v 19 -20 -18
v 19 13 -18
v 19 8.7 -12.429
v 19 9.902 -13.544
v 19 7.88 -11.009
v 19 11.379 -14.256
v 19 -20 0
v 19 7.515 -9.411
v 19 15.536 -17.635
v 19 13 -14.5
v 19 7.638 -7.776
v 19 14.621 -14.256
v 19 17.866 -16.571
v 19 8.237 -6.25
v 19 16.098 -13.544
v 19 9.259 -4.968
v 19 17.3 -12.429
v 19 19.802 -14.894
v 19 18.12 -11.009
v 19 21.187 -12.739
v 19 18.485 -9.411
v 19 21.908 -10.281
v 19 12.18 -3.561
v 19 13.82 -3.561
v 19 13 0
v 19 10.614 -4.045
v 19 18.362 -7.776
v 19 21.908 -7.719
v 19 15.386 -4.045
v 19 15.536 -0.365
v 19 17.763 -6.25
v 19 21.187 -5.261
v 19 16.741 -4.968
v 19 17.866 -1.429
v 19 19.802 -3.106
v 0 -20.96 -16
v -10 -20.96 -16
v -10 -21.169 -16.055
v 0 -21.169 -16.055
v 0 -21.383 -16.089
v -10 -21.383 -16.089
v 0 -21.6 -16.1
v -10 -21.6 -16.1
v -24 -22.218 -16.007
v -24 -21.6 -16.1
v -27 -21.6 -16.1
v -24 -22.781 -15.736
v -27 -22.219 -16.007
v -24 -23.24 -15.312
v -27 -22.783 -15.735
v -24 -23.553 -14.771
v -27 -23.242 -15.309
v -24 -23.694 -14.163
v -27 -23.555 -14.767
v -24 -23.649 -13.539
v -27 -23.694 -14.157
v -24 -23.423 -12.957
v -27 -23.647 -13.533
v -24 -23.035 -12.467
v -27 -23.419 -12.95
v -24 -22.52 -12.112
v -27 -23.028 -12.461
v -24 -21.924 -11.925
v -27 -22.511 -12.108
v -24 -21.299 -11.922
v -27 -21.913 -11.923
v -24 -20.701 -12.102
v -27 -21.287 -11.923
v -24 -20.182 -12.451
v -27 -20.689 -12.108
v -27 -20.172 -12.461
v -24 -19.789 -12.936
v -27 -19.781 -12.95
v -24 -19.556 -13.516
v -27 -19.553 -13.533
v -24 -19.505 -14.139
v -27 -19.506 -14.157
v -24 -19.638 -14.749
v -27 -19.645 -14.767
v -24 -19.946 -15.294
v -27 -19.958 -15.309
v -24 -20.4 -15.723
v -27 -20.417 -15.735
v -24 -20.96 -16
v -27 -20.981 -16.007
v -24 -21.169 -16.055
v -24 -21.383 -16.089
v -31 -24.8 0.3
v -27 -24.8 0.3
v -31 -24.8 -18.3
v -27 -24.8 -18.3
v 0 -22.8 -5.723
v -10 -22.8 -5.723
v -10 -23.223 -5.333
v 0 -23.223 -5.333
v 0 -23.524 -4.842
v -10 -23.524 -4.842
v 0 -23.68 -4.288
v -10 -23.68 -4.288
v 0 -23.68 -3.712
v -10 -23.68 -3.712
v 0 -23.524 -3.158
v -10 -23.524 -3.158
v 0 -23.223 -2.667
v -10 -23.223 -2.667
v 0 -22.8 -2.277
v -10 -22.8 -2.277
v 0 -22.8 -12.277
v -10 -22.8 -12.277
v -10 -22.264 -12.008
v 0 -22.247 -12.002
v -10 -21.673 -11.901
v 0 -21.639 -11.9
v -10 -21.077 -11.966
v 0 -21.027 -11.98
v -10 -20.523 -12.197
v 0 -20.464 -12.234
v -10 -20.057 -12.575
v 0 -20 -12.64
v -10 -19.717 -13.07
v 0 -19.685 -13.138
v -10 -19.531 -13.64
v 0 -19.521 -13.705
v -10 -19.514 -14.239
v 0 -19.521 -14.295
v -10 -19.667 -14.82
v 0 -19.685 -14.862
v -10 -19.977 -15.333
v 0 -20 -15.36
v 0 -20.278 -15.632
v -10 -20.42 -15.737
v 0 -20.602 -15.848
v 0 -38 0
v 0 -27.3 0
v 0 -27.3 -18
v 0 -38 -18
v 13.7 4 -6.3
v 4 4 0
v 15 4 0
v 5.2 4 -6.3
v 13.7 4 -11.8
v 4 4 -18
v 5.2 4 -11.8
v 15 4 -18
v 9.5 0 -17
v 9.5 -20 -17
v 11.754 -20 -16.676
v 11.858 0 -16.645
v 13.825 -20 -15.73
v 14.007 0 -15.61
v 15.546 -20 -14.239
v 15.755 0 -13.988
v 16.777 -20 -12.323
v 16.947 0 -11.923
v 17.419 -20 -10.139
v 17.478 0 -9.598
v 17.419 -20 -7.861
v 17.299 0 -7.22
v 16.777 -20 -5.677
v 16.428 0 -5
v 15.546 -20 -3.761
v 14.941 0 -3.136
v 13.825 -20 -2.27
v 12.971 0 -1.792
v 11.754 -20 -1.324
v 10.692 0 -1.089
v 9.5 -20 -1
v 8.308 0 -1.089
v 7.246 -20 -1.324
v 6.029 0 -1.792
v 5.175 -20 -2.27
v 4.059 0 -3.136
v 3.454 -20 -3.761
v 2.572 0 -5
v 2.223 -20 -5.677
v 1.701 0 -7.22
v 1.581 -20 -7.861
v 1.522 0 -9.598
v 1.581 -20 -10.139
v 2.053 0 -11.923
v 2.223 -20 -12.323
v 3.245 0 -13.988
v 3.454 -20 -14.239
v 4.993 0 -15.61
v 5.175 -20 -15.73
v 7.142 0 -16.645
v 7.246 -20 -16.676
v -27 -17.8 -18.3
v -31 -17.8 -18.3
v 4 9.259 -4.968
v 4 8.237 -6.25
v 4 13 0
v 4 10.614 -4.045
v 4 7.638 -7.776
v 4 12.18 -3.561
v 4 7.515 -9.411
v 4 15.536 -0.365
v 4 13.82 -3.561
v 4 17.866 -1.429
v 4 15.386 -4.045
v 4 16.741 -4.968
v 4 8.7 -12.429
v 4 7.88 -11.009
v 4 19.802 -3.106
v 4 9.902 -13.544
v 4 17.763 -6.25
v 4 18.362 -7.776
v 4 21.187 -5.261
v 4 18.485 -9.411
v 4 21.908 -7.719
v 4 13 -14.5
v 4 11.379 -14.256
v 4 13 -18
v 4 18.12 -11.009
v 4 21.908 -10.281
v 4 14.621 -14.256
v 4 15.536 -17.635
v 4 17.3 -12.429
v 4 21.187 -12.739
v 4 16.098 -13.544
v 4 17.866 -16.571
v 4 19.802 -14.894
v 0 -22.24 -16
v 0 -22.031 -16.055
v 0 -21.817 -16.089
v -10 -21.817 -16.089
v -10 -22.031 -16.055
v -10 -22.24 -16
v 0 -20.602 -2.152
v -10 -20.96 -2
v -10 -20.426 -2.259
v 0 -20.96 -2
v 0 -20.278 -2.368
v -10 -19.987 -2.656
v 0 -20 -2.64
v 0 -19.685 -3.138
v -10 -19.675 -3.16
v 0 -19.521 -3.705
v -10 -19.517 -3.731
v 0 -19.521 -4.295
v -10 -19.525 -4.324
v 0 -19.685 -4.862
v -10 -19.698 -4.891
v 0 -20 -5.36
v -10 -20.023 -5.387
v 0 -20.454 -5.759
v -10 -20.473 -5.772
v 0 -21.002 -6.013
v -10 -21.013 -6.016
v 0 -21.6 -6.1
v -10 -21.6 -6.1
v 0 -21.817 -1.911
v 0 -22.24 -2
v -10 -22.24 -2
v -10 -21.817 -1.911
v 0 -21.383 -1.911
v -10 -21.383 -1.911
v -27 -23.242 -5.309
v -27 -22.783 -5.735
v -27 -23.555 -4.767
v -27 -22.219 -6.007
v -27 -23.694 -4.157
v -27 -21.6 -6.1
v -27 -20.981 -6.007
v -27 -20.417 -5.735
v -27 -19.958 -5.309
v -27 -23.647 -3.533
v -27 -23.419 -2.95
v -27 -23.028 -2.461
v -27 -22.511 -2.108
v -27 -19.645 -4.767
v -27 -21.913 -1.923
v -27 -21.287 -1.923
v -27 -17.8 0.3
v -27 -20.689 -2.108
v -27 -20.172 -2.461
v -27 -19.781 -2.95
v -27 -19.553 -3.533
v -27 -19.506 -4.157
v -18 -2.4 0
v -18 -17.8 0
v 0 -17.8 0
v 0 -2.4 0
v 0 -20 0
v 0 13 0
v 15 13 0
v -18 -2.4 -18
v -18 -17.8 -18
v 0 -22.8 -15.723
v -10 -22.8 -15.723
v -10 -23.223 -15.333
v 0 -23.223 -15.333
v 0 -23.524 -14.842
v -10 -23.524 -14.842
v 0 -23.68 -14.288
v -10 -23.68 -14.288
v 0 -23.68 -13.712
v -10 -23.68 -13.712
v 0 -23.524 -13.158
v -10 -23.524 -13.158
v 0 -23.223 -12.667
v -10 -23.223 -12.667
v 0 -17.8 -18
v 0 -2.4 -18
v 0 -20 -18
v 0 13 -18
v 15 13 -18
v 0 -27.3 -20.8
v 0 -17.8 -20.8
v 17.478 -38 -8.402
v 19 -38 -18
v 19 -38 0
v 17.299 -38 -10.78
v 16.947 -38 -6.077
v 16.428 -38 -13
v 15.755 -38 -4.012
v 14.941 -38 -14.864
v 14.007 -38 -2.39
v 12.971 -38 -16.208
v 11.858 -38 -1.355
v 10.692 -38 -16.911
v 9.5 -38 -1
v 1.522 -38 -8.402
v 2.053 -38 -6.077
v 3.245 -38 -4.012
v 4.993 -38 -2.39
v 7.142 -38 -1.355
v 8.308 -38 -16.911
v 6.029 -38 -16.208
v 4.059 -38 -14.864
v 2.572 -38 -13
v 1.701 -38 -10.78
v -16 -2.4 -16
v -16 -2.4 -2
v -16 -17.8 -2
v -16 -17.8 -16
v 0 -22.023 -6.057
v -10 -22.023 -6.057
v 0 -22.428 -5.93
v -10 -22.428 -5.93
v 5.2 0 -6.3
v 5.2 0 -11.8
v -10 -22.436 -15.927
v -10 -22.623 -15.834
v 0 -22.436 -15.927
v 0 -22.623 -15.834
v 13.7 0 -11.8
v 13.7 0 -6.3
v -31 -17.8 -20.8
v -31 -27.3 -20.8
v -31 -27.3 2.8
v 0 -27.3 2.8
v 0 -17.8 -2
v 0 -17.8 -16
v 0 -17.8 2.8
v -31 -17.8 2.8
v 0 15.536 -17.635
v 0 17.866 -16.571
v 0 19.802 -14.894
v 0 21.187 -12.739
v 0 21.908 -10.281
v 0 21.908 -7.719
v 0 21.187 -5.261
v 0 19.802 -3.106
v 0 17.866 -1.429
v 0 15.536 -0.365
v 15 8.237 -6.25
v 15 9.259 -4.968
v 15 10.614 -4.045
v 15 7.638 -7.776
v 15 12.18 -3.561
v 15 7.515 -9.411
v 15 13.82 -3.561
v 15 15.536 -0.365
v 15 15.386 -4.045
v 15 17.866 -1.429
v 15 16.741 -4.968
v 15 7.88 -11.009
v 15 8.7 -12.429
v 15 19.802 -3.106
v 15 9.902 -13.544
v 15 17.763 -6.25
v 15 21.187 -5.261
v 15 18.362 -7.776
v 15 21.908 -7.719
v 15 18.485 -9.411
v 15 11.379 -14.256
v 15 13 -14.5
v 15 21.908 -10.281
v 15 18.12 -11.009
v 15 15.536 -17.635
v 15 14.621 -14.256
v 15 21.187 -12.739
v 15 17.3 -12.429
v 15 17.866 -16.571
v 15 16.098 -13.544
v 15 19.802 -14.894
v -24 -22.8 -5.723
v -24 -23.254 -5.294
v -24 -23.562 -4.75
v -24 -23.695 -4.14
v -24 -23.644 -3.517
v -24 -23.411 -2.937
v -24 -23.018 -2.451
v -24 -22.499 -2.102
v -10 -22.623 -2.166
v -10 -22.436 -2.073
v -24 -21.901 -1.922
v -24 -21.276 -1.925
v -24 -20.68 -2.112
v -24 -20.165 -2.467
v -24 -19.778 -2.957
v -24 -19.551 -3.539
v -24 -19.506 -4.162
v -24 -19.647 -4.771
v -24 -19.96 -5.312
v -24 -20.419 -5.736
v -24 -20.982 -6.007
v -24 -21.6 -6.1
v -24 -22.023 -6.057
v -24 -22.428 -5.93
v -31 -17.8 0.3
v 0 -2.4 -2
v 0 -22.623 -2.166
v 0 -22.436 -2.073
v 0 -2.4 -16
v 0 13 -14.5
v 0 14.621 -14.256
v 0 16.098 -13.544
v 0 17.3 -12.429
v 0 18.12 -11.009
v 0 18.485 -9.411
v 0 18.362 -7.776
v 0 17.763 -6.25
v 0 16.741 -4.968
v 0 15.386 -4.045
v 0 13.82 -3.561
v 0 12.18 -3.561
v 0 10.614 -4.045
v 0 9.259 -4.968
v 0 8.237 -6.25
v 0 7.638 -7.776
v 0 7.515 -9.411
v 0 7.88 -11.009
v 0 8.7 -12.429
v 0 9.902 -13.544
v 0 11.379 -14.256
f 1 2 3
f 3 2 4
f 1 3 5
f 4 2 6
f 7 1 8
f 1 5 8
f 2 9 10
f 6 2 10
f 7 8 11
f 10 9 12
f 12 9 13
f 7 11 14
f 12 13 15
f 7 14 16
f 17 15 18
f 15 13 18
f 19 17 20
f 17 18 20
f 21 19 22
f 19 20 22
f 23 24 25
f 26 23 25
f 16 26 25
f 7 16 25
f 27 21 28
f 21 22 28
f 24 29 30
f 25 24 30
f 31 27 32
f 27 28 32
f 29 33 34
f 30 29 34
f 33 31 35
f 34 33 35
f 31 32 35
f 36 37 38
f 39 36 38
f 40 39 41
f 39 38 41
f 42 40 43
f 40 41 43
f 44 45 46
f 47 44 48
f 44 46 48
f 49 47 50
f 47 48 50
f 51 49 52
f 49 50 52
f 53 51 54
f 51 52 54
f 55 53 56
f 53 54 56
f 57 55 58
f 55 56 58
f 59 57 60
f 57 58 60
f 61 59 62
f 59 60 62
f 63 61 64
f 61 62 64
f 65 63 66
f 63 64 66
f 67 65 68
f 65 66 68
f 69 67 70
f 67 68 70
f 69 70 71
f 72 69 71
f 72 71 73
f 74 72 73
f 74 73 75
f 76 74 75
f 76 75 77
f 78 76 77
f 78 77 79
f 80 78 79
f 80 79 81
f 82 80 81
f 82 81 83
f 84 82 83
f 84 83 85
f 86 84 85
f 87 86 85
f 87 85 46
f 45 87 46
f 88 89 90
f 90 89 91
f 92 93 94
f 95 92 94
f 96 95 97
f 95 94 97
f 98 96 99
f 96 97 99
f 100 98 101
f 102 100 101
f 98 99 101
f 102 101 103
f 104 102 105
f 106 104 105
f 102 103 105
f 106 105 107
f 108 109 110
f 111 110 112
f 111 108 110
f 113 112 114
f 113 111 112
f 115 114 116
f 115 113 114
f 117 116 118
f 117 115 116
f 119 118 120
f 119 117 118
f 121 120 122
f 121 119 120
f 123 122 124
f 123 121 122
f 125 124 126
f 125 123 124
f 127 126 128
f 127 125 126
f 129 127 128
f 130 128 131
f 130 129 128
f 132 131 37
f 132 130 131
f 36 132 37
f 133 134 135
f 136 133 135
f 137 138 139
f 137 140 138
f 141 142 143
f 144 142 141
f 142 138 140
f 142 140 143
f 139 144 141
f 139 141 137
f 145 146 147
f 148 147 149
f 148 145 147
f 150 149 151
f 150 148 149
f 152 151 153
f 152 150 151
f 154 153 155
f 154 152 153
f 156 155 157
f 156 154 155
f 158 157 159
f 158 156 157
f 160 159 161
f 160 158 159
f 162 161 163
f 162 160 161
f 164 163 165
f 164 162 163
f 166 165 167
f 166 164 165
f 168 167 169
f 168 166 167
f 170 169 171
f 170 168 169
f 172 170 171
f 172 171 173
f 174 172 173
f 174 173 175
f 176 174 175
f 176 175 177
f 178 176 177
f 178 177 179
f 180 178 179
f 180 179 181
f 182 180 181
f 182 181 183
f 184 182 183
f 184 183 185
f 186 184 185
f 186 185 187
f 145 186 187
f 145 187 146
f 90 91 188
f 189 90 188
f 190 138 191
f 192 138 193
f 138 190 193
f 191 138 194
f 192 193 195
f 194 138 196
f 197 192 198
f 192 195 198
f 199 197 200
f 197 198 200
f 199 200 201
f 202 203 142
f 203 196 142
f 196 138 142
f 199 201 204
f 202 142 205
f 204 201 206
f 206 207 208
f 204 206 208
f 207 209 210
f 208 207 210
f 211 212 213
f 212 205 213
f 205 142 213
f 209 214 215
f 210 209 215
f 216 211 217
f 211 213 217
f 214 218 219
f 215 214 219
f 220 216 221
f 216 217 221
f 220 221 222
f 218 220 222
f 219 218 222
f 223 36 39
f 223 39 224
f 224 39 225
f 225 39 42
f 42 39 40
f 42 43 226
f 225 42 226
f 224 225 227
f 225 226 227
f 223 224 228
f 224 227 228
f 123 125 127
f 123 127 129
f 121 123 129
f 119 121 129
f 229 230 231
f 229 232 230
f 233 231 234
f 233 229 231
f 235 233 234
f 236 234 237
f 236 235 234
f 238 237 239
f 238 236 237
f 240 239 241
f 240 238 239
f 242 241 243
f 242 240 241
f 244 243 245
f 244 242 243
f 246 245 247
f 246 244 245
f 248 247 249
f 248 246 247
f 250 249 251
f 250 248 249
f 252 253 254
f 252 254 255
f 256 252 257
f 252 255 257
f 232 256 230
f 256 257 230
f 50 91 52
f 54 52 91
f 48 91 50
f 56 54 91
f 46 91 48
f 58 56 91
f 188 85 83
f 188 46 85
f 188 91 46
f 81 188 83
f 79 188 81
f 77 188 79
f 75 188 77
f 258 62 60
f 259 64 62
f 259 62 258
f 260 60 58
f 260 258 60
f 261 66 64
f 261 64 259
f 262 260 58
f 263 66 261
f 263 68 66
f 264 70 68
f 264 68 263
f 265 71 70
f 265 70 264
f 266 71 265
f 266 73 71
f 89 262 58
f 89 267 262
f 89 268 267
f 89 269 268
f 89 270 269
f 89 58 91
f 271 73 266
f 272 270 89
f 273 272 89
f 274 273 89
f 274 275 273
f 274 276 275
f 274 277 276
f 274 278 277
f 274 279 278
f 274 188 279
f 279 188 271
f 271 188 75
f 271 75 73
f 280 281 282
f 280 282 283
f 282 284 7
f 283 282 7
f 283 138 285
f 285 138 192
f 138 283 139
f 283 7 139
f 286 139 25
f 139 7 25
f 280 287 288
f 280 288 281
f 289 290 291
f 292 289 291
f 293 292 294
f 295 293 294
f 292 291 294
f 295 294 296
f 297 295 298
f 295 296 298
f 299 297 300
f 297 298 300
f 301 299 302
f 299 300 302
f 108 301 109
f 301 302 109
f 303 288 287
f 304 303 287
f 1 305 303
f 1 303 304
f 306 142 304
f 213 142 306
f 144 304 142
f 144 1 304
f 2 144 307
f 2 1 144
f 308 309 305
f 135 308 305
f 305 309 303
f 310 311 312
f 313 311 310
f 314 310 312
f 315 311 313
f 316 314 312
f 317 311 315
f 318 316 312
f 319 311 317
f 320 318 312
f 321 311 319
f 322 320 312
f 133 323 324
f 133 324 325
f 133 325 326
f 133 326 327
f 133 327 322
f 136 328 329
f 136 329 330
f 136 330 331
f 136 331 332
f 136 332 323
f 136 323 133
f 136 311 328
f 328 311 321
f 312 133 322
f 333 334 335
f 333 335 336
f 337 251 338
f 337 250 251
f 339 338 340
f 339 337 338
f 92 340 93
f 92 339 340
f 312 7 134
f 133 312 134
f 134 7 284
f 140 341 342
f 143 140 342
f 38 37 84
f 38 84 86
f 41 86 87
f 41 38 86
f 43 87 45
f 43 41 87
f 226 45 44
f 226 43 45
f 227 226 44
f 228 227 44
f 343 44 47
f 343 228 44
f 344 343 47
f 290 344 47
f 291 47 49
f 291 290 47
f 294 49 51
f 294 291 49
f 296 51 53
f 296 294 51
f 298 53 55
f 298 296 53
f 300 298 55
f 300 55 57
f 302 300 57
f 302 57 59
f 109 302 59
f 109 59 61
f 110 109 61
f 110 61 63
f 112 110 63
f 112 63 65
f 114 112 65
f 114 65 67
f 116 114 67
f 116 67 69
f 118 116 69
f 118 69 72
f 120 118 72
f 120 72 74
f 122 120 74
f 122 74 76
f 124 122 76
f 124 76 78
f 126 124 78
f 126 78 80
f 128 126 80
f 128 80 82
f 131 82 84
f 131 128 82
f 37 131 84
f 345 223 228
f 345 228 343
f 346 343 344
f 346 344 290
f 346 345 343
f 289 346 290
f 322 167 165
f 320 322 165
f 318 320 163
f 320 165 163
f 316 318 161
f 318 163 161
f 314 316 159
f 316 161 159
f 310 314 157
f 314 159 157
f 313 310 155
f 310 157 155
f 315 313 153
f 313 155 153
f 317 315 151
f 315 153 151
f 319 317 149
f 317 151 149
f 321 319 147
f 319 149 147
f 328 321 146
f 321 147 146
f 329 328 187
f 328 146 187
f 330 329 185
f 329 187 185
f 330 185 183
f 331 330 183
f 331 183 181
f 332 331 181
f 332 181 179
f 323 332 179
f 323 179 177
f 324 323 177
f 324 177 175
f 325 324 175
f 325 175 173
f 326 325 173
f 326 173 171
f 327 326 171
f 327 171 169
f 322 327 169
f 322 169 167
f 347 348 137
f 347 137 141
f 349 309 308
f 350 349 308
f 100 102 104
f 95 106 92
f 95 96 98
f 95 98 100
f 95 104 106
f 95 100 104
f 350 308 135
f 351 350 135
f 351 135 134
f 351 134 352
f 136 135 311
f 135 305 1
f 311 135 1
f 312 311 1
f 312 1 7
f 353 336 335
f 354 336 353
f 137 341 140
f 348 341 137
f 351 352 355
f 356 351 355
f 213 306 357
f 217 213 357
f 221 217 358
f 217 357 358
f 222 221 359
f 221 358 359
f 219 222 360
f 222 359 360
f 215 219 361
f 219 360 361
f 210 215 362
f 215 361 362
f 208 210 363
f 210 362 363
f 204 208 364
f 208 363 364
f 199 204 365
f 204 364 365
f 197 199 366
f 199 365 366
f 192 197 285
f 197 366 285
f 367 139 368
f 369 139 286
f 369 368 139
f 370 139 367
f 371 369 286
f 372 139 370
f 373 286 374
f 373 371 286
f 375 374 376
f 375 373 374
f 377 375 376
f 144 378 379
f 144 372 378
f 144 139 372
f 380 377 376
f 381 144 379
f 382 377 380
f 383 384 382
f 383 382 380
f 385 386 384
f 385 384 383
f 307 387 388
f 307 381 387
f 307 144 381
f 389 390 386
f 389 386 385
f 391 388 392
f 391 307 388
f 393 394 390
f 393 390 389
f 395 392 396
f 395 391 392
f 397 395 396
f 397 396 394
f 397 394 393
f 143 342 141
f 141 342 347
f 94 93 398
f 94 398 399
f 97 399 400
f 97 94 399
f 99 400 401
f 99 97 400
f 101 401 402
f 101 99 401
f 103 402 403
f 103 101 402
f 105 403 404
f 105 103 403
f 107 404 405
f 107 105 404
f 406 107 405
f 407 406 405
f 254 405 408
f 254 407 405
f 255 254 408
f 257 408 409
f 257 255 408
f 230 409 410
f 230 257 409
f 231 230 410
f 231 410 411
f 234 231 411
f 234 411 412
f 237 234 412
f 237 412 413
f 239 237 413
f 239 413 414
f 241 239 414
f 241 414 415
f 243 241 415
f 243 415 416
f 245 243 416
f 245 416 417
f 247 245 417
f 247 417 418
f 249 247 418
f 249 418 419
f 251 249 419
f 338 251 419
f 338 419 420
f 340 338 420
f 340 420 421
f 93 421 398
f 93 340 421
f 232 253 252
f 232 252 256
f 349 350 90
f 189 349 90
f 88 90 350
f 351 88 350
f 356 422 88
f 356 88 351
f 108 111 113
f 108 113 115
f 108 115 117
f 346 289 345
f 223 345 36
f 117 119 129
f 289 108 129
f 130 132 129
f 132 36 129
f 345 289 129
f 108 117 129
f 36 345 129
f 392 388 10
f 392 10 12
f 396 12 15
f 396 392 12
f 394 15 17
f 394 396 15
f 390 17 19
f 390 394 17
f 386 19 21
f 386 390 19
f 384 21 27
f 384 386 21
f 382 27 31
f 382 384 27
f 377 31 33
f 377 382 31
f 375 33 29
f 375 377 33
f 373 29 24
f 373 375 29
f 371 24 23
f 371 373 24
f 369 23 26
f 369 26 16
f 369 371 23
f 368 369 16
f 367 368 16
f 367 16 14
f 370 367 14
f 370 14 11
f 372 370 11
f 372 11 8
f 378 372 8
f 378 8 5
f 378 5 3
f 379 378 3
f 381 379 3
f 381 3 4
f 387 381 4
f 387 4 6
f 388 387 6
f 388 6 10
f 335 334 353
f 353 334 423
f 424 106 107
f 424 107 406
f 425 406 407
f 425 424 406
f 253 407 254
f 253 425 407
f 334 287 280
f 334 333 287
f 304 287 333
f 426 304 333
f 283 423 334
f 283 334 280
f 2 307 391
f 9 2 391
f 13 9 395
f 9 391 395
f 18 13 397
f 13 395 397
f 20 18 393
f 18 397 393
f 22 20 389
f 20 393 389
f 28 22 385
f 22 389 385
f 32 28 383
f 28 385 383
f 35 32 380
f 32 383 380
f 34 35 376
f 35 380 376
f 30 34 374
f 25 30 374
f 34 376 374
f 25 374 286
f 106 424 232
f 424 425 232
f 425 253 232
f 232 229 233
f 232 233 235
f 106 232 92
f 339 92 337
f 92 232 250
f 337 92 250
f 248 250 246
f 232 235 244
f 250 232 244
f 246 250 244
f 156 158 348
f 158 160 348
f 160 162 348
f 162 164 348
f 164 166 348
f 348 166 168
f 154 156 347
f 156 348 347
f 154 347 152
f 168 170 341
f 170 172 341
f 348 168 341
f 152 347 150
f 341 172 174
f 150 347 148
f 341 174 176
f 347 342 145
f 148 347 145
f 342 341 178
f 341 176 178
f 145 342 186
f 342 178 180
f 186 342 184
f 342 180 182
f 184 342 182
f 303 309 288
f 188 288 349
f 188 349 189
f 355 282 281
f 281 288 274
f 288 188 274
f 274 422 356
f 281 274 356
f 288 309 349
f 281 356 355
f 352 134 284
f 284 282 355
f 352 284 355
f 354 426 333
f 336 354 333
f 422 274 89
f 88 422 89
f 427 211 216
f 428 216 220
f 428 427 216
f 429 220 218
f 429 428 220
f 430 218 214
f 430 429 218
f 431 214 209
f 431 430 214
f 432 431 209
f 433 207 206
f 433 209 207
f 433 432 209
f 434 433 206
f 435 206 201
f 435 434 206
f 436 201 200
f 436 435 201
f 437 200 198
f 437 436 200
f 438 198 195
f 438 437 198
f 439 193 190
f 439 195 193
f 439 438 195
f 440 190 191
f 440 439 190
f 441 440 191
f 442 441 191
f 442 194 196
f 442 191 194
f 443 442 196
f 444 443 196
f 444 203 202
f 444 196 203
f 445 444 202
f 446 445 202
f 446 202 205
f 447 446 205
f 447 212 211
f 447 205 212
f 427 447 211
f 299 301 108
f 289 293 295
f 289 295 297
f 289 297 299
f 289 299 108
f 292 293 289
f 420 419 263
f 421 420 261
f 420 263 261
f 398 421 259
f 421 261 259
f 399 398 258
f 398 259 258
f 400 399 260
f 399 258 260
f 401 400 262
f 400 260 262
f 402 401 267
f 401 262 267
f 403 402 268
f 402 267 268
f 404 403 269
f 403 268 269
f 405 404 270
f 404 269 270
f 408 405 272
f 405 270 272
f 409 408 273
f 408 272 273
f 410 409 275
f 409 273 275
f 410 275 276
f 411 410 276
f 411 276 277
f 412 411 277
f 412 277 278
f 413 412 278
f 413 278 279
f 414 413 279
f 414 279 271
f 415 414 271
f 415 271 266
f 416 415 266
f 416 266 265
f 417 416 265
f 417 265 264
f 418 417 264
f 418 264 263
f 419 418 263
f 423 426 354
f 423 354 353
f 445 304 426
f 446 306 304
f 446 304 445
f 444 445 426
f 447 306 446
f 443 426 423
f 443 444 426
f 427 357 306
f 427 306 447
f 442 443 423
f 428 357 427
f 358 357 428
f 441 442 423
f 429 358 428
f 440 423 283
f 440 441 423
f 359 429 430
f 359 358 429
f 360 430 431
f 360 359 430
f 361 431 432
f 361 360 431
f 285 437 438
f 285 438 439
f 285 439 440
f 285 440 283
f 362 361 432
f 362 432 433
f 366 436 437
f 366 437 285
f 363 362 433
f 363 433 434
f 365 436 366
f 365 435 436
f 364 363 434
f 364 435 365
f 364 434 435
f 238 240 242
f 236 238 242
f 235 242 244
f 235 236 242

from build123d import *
from build123d.topology import SkipClean

# Parameters (mm, degrees)
SKETCH2_R                        = 5.5
BOSS_EXTRUDE1_DEPTH              = 19
CUT_EXTRUDE1_DEPTH               = 35.190641995
CUT_EXTRUDE1_DEPTH_BACK          = 35.190641995
SKETCH3_W                        = 11
SKETCH3_H                        = 18
SKETCH4_W                        = 8.5
SKETCH4_H                        = 5.5
CUT_EXTRUDE4_DEPTH               = 19
SKETCH5_W                        = 19
SKETCH5_H                        = 18
SKETCH5_R                        = 8
BOSS_EXTRUDE4_DEPTH              = 20
F_3DSKETCH1_R                    = 8
BOSS_EXTRUDE5_DEPTH              = 18
BOSS_EXTRUDE8_DEPTH              = 10
BOSS_EXTRUDE19_REACH             = 53.078
SKETCH8_W                        = 18.6
SKETCH8_H                        = 7
SKETCH8_R                        = 2.1
BOSS_EXTRUDE19_DIRECTION_2_DEPTH = 14
SKETCH8_13_W                     = 2
SKETCH8_13_H                     = 2.5
SKETCH8_13_H_2                   = 0.5
SKETCH8_13_R                     = 2.1
CUT_EXTRUDE7_DEPTH               = 10
BOSS_EXTRUDE20_DEPTH             = 18
BOSS_EXTRUDE20_DEPTH_BACK        = 10
BOSS_EXTRUDE22_START             = 3
SKETCH11_W                       = 18.6
SKETCH11_H                       = 7
SKETCH11_R                       = 2.1
BOSS_EXTRUDE22_DEPTH             = 3
BOSS_EXTRUDE23_DEPTH             = 21
SKETCH12_W                       = 18
SKETCH12_H                       = 15.4
BOSS_EXTRUDE26_DEPTH             = 18
SKETCH13_W                       = 14
SKETCH13_H                       = 14
SKETCH13_W_2                     = 2
CUT_EXTRUDE8_DEPTH               = 15.4


with BuildPart() as part:
    # Sketch2 → Boss-Extrude1 (new body)
    with BuildSketch(Plane(origin=(0, 0, 0), x_dir=(0, 0, -1), z_dir=(1, 0, 0))):
        with BuildLine():
            Line((0, 0), (18, 0))
            Line((18, 0), (18, 13))
            ThreePointArc((18, 13), (9, 22), (0, 13))
            Line((0, 13), (0, 0))
        make_face()
        with Locations((9, 13)):
            Circle(SKETCH2_R, mode=Mode.SUBTRACT)
    extrude(amount=BOSS_EXTRUDE1_DEPTH)

    # Sketch3 → Cut-Extrude1 (cut, two sides: drawn at the far end of the back side and taken through both)
    with BuildSketch(Plane.XY.offset(-CUT_EXTRUDE1_DEPTH_BACK)):
        with Locations((9.5, 13)):
            Rectangle(SKETCH3_W, SKETCH3_H)
    extrude(amount=CUT_EXTRUDE1_DEPTH + CUT_EXTRUDE1_DEPTH_BACK, mode=Mode.SUBTRACT)

    # Sketch4 → Cut-Extrude4 (cut)
    with BuildSketch(Plane(origin=(0, 0, 0), x_dir=(1, 0, 0), z_dir=(0, 1, 0))):
        with Locations((9.45, 9.05)):
            Rectangle(SKETCH4_W, SKETCH4_H)
    extrude(amount=CUT_EXTRUDE4_DEPTH, mode=Mode.SUBTRACT)

    # Sketch5 → Boss-Extrude4 (add)
    with BuildSketch(Plane.XZ):
        with Locations((9.5, -9)):
            Rectangle(SKETCH5_W, SKETCH5_H)
        with Locations(Location((9.5, -9, 0), (0, 0, 270))):
            Circle(SKETCH5_R, mode=Mode.SUBTRACT)
    extrude(amount=BOSS_EXTRUDE4_DEPTH)

    # 3DSketch1 → Boss-Extrude5 (add)
    with BuildSketch(Plane(origin=(0, -20, 0), x_dir=(0.7259526839058267, 0, -0.687744647910783), z_dir=(0, 1, 0))):
        Polygon((0, 0), (12.379403662, 13.06714831), (26.172504657, 0), (13.793100994, -13.06714831), align=None)
        with Locations(Location((13.086252328, 0, 0), (0, 0, 226.548157699))):
            Circle(F_3DSKETCH1_R, mode=Mode.SUBTRACT)
    extrude(amount=-BOSS_EXTRUDE5_DEPTH)

    # Sketch7 → Boss-Extrude8 (add)
    with BuildSketch(Plane.ZY):
        Polygon((0, -23.8), (0, -14.8), (-2, -14.8), (-2, -22.8), (-7, -22.8), (-7, -24.8), (0, -24.8), align=None)
        Polygon((-16, -14.8), (-18, -14.8), (-18, -23.8), (-18, -24.8), (-11, -24.8), (-11, -22.8), (-16, -22.8), align=None)
    extrude(amount=BOSS_EXTRUDE8_DEPTH)

    # Boss-Extrude19: up to this face of the body (flat: up to its plane)
    boss_extrude19_end = Plane(part.part.faces().sort_by_distance((0, -10.449751669, -9))[0])
    # Sketch8 → Boss-Extrude19 (add, up to the picked face)
    with BuildSketch(Plane.ZY.offset(10), mode=Mode.PRIVATE) as boss_extrude19_sk1:
        with Locations((-9, -21.3)):
            Rectangle(SKETCH8_W, SKETCH8_H)
        with Locations(Location((-14, -21.6, 0), (0, 0, 162.247209838))):
            Circle(SKETCH8_R, mode=Mode.SUBTRACT)
        with Locations(Location((-4, -21.6, 0), (0, 0, 214.849904579))):
            Circle(SKETCH8_R, mode=Mode.SUBTRACT)
    boss_extrude19_tool1 = split(extrude(boss_extrude19_sk1.sketch, amount=-BOSS_EXTRUDE19_REACH, mode=Mode.PRIVATE), bisect_by=boss_extrude19_end, keep=Keep.BOTH, mode=Mode.PRIVATE)
    add(boss_extrude19_tool1.solids().sort_by(Axis((-10, -21.218894, -9), (1, 0, 0)))[0])

    # Sketch8 → Boss-Extrude19 direction 2 (add)
    with SkipClean():  # the faces are left unmerged after this step: merging them gives an invalid solid
        with BuildSketch(Plane.ZY.offset(10)):
            with Locations((-9, -21.3)):
                Rectangle(SKETCH8_W, SKETCH8_H)
            with Locations(Location((-14, -21.6, 0), (0, 0, 162.247209838))):
                Circle(SKETCH8_R, mode=Mode.SUBTRACT)
            with Locations(Location((-4, -21.6, 0), (0, 0, 214.849904579))):
                Circle(SKETCH8_R, mode=Mode.SUBTRACT)
        extrude(amount=BOSS_EXTRUDE19_DIRECTION_2_DEPTH)
    add(part.part.scale(1), mode=Mode.REPLACE)  # the faces are merged on a copy

    # Sketch8<13> → Cut-Extrude7 (cut)
    with SkipClean():  # the faces are left unmerged after this step: merging them gives an invalid solid
        with BuildSketch(Plane.ZY.offset(10)):
            with Locations((-17, -16.55)):
                Rectangle(SKETCH8_13_W, SKETCH8_13_H)
            with Locations((-17, -15.05)):
                Rectangle(SKETCH8_13_W, SKETCH8_13_H_2)
            with Locations((-1, -16.55)):
                Rectangle(SKETCH8_13_W, SKETCH8_13_H)
            with Locations((-1, -15.05)):
                Rectangle(SKETCH8_13_W, SKETCH8_13_H_2)
            with Locations(Location((-14, -21.6, 0), (0, 0, 180))):
                Circle(SKETCH8_13_R)
            with Locations(Location((-4, -21.6, 0), (0, 0, 180))):
                Circle(SKETCH8_13_R)
        extrude(amount=-CUT_EXTRUDE7_DEPTH, mode=Mode.SUBTRACT)
    add(part.part.scale(1), mode=Mode.REPLACE)  # the faces are merged on a copy

    # Sketch8<14> → Boss-Extrude20 (add, two sides: drawn at the far end of the back side and taken through both)
    with BuildSketch(Plane.ZY.offset(10).offset(-BOSS_EXTRUDE20_DEPTH_BACK)):
        Polygon((-11, -24.8), (-18, -24.8), (-18.3, -24.8), (-18.3, -17.8), (-20.485605357, -17.8), (-20.8, -17.8), (-20.8, -27.3), (-18, -27.3), (0, -27.3), (2.8, -27.3), (2.8, -17.8), (0.3, -17.8), (0.3, -24.8), (0, -24.8), (-9, -24.8), align=None)
    extrude(amount=BOSS_EXTRUDE20_DEPTH + BOSS_EXTRUDE20_DEPTH_BACK)

    # Sketch11 → Boss-Extrude22 (add)
    with SkipClean():  # the faces are left unmerged after this step: merging them gives an invalid solid
        with BuildSketch(Plane.ZY.offset(24).offset(BOSS_EXTRUDE22_START)):
            with Locations((-9, -21.3)):
                Rectangle(SKETCH11_W, SKETCH11_H)
            with Locations(Location((-14, -21.6, 0), (0, 0, 180))):
                Circle(SKETCH11_R, mode=Mode.SUBTRACT)
            with Locations(Location((-4, -21.6, 0), (0, 0, 180))):
                Circle(SKETCH11_R, mode=Mode.SUBTRACT)
        extrude(amount=-BOSS_EXTRUDE22_DEPTH)
    add(part.part.scale(1), mode=Mode.REPLACE)  # the faces are merged on a copy

    # Sketch8<15> → Boss-Extrude23 (add)
    with BuildSketch(Plane.ZY.offset(10)):
        Polygon((-11, -24.8), (-18, -24.8), (-18.3, -24.8), (-18.3, -17.8), (-20.485605357, -17.8), (-20.8, -17.8), (-20.8, -27.3), (-18, -27.3), (0, -27.3), (2.8, -27.3), (2.8, -17.8), (0.3, -17.8), (0.3, -24.8), (0, -24.8), (-9, -24.8), align=None)
    extrude(amount=BOSS_EXTRUDE23_DEPTH)

    # Sketch12 → Boss-Extrude26 (add)
    with BuildSketch(Plane.ZY):
        with Locations((-9, -10.1)):
            Rectangle(SKETCH12_W, SKETCH12_H)
    extrude(amount=BOSS_EXTRUDE26_DEPTH)

    # Sketch13 → Cut-Extrude8 (cut)
    with BuildSketch(Plane(origin=(0, -2.4, 0), x_dir=(1, 0, 0), z_dir=(0, 1, 0))):
        with Locations((-9, 9)):
            Rectangle(SKETCH13_W, SKETCH13_H)
        with Locations((-1, 9)):
            Rectangle(SKETCH13_W_2, SKETCH13_H)
    extrude(amount=-CUT_EXTRUDE8_DEPTH, mode=Mode.SUBTRACT)


solid = part.part
